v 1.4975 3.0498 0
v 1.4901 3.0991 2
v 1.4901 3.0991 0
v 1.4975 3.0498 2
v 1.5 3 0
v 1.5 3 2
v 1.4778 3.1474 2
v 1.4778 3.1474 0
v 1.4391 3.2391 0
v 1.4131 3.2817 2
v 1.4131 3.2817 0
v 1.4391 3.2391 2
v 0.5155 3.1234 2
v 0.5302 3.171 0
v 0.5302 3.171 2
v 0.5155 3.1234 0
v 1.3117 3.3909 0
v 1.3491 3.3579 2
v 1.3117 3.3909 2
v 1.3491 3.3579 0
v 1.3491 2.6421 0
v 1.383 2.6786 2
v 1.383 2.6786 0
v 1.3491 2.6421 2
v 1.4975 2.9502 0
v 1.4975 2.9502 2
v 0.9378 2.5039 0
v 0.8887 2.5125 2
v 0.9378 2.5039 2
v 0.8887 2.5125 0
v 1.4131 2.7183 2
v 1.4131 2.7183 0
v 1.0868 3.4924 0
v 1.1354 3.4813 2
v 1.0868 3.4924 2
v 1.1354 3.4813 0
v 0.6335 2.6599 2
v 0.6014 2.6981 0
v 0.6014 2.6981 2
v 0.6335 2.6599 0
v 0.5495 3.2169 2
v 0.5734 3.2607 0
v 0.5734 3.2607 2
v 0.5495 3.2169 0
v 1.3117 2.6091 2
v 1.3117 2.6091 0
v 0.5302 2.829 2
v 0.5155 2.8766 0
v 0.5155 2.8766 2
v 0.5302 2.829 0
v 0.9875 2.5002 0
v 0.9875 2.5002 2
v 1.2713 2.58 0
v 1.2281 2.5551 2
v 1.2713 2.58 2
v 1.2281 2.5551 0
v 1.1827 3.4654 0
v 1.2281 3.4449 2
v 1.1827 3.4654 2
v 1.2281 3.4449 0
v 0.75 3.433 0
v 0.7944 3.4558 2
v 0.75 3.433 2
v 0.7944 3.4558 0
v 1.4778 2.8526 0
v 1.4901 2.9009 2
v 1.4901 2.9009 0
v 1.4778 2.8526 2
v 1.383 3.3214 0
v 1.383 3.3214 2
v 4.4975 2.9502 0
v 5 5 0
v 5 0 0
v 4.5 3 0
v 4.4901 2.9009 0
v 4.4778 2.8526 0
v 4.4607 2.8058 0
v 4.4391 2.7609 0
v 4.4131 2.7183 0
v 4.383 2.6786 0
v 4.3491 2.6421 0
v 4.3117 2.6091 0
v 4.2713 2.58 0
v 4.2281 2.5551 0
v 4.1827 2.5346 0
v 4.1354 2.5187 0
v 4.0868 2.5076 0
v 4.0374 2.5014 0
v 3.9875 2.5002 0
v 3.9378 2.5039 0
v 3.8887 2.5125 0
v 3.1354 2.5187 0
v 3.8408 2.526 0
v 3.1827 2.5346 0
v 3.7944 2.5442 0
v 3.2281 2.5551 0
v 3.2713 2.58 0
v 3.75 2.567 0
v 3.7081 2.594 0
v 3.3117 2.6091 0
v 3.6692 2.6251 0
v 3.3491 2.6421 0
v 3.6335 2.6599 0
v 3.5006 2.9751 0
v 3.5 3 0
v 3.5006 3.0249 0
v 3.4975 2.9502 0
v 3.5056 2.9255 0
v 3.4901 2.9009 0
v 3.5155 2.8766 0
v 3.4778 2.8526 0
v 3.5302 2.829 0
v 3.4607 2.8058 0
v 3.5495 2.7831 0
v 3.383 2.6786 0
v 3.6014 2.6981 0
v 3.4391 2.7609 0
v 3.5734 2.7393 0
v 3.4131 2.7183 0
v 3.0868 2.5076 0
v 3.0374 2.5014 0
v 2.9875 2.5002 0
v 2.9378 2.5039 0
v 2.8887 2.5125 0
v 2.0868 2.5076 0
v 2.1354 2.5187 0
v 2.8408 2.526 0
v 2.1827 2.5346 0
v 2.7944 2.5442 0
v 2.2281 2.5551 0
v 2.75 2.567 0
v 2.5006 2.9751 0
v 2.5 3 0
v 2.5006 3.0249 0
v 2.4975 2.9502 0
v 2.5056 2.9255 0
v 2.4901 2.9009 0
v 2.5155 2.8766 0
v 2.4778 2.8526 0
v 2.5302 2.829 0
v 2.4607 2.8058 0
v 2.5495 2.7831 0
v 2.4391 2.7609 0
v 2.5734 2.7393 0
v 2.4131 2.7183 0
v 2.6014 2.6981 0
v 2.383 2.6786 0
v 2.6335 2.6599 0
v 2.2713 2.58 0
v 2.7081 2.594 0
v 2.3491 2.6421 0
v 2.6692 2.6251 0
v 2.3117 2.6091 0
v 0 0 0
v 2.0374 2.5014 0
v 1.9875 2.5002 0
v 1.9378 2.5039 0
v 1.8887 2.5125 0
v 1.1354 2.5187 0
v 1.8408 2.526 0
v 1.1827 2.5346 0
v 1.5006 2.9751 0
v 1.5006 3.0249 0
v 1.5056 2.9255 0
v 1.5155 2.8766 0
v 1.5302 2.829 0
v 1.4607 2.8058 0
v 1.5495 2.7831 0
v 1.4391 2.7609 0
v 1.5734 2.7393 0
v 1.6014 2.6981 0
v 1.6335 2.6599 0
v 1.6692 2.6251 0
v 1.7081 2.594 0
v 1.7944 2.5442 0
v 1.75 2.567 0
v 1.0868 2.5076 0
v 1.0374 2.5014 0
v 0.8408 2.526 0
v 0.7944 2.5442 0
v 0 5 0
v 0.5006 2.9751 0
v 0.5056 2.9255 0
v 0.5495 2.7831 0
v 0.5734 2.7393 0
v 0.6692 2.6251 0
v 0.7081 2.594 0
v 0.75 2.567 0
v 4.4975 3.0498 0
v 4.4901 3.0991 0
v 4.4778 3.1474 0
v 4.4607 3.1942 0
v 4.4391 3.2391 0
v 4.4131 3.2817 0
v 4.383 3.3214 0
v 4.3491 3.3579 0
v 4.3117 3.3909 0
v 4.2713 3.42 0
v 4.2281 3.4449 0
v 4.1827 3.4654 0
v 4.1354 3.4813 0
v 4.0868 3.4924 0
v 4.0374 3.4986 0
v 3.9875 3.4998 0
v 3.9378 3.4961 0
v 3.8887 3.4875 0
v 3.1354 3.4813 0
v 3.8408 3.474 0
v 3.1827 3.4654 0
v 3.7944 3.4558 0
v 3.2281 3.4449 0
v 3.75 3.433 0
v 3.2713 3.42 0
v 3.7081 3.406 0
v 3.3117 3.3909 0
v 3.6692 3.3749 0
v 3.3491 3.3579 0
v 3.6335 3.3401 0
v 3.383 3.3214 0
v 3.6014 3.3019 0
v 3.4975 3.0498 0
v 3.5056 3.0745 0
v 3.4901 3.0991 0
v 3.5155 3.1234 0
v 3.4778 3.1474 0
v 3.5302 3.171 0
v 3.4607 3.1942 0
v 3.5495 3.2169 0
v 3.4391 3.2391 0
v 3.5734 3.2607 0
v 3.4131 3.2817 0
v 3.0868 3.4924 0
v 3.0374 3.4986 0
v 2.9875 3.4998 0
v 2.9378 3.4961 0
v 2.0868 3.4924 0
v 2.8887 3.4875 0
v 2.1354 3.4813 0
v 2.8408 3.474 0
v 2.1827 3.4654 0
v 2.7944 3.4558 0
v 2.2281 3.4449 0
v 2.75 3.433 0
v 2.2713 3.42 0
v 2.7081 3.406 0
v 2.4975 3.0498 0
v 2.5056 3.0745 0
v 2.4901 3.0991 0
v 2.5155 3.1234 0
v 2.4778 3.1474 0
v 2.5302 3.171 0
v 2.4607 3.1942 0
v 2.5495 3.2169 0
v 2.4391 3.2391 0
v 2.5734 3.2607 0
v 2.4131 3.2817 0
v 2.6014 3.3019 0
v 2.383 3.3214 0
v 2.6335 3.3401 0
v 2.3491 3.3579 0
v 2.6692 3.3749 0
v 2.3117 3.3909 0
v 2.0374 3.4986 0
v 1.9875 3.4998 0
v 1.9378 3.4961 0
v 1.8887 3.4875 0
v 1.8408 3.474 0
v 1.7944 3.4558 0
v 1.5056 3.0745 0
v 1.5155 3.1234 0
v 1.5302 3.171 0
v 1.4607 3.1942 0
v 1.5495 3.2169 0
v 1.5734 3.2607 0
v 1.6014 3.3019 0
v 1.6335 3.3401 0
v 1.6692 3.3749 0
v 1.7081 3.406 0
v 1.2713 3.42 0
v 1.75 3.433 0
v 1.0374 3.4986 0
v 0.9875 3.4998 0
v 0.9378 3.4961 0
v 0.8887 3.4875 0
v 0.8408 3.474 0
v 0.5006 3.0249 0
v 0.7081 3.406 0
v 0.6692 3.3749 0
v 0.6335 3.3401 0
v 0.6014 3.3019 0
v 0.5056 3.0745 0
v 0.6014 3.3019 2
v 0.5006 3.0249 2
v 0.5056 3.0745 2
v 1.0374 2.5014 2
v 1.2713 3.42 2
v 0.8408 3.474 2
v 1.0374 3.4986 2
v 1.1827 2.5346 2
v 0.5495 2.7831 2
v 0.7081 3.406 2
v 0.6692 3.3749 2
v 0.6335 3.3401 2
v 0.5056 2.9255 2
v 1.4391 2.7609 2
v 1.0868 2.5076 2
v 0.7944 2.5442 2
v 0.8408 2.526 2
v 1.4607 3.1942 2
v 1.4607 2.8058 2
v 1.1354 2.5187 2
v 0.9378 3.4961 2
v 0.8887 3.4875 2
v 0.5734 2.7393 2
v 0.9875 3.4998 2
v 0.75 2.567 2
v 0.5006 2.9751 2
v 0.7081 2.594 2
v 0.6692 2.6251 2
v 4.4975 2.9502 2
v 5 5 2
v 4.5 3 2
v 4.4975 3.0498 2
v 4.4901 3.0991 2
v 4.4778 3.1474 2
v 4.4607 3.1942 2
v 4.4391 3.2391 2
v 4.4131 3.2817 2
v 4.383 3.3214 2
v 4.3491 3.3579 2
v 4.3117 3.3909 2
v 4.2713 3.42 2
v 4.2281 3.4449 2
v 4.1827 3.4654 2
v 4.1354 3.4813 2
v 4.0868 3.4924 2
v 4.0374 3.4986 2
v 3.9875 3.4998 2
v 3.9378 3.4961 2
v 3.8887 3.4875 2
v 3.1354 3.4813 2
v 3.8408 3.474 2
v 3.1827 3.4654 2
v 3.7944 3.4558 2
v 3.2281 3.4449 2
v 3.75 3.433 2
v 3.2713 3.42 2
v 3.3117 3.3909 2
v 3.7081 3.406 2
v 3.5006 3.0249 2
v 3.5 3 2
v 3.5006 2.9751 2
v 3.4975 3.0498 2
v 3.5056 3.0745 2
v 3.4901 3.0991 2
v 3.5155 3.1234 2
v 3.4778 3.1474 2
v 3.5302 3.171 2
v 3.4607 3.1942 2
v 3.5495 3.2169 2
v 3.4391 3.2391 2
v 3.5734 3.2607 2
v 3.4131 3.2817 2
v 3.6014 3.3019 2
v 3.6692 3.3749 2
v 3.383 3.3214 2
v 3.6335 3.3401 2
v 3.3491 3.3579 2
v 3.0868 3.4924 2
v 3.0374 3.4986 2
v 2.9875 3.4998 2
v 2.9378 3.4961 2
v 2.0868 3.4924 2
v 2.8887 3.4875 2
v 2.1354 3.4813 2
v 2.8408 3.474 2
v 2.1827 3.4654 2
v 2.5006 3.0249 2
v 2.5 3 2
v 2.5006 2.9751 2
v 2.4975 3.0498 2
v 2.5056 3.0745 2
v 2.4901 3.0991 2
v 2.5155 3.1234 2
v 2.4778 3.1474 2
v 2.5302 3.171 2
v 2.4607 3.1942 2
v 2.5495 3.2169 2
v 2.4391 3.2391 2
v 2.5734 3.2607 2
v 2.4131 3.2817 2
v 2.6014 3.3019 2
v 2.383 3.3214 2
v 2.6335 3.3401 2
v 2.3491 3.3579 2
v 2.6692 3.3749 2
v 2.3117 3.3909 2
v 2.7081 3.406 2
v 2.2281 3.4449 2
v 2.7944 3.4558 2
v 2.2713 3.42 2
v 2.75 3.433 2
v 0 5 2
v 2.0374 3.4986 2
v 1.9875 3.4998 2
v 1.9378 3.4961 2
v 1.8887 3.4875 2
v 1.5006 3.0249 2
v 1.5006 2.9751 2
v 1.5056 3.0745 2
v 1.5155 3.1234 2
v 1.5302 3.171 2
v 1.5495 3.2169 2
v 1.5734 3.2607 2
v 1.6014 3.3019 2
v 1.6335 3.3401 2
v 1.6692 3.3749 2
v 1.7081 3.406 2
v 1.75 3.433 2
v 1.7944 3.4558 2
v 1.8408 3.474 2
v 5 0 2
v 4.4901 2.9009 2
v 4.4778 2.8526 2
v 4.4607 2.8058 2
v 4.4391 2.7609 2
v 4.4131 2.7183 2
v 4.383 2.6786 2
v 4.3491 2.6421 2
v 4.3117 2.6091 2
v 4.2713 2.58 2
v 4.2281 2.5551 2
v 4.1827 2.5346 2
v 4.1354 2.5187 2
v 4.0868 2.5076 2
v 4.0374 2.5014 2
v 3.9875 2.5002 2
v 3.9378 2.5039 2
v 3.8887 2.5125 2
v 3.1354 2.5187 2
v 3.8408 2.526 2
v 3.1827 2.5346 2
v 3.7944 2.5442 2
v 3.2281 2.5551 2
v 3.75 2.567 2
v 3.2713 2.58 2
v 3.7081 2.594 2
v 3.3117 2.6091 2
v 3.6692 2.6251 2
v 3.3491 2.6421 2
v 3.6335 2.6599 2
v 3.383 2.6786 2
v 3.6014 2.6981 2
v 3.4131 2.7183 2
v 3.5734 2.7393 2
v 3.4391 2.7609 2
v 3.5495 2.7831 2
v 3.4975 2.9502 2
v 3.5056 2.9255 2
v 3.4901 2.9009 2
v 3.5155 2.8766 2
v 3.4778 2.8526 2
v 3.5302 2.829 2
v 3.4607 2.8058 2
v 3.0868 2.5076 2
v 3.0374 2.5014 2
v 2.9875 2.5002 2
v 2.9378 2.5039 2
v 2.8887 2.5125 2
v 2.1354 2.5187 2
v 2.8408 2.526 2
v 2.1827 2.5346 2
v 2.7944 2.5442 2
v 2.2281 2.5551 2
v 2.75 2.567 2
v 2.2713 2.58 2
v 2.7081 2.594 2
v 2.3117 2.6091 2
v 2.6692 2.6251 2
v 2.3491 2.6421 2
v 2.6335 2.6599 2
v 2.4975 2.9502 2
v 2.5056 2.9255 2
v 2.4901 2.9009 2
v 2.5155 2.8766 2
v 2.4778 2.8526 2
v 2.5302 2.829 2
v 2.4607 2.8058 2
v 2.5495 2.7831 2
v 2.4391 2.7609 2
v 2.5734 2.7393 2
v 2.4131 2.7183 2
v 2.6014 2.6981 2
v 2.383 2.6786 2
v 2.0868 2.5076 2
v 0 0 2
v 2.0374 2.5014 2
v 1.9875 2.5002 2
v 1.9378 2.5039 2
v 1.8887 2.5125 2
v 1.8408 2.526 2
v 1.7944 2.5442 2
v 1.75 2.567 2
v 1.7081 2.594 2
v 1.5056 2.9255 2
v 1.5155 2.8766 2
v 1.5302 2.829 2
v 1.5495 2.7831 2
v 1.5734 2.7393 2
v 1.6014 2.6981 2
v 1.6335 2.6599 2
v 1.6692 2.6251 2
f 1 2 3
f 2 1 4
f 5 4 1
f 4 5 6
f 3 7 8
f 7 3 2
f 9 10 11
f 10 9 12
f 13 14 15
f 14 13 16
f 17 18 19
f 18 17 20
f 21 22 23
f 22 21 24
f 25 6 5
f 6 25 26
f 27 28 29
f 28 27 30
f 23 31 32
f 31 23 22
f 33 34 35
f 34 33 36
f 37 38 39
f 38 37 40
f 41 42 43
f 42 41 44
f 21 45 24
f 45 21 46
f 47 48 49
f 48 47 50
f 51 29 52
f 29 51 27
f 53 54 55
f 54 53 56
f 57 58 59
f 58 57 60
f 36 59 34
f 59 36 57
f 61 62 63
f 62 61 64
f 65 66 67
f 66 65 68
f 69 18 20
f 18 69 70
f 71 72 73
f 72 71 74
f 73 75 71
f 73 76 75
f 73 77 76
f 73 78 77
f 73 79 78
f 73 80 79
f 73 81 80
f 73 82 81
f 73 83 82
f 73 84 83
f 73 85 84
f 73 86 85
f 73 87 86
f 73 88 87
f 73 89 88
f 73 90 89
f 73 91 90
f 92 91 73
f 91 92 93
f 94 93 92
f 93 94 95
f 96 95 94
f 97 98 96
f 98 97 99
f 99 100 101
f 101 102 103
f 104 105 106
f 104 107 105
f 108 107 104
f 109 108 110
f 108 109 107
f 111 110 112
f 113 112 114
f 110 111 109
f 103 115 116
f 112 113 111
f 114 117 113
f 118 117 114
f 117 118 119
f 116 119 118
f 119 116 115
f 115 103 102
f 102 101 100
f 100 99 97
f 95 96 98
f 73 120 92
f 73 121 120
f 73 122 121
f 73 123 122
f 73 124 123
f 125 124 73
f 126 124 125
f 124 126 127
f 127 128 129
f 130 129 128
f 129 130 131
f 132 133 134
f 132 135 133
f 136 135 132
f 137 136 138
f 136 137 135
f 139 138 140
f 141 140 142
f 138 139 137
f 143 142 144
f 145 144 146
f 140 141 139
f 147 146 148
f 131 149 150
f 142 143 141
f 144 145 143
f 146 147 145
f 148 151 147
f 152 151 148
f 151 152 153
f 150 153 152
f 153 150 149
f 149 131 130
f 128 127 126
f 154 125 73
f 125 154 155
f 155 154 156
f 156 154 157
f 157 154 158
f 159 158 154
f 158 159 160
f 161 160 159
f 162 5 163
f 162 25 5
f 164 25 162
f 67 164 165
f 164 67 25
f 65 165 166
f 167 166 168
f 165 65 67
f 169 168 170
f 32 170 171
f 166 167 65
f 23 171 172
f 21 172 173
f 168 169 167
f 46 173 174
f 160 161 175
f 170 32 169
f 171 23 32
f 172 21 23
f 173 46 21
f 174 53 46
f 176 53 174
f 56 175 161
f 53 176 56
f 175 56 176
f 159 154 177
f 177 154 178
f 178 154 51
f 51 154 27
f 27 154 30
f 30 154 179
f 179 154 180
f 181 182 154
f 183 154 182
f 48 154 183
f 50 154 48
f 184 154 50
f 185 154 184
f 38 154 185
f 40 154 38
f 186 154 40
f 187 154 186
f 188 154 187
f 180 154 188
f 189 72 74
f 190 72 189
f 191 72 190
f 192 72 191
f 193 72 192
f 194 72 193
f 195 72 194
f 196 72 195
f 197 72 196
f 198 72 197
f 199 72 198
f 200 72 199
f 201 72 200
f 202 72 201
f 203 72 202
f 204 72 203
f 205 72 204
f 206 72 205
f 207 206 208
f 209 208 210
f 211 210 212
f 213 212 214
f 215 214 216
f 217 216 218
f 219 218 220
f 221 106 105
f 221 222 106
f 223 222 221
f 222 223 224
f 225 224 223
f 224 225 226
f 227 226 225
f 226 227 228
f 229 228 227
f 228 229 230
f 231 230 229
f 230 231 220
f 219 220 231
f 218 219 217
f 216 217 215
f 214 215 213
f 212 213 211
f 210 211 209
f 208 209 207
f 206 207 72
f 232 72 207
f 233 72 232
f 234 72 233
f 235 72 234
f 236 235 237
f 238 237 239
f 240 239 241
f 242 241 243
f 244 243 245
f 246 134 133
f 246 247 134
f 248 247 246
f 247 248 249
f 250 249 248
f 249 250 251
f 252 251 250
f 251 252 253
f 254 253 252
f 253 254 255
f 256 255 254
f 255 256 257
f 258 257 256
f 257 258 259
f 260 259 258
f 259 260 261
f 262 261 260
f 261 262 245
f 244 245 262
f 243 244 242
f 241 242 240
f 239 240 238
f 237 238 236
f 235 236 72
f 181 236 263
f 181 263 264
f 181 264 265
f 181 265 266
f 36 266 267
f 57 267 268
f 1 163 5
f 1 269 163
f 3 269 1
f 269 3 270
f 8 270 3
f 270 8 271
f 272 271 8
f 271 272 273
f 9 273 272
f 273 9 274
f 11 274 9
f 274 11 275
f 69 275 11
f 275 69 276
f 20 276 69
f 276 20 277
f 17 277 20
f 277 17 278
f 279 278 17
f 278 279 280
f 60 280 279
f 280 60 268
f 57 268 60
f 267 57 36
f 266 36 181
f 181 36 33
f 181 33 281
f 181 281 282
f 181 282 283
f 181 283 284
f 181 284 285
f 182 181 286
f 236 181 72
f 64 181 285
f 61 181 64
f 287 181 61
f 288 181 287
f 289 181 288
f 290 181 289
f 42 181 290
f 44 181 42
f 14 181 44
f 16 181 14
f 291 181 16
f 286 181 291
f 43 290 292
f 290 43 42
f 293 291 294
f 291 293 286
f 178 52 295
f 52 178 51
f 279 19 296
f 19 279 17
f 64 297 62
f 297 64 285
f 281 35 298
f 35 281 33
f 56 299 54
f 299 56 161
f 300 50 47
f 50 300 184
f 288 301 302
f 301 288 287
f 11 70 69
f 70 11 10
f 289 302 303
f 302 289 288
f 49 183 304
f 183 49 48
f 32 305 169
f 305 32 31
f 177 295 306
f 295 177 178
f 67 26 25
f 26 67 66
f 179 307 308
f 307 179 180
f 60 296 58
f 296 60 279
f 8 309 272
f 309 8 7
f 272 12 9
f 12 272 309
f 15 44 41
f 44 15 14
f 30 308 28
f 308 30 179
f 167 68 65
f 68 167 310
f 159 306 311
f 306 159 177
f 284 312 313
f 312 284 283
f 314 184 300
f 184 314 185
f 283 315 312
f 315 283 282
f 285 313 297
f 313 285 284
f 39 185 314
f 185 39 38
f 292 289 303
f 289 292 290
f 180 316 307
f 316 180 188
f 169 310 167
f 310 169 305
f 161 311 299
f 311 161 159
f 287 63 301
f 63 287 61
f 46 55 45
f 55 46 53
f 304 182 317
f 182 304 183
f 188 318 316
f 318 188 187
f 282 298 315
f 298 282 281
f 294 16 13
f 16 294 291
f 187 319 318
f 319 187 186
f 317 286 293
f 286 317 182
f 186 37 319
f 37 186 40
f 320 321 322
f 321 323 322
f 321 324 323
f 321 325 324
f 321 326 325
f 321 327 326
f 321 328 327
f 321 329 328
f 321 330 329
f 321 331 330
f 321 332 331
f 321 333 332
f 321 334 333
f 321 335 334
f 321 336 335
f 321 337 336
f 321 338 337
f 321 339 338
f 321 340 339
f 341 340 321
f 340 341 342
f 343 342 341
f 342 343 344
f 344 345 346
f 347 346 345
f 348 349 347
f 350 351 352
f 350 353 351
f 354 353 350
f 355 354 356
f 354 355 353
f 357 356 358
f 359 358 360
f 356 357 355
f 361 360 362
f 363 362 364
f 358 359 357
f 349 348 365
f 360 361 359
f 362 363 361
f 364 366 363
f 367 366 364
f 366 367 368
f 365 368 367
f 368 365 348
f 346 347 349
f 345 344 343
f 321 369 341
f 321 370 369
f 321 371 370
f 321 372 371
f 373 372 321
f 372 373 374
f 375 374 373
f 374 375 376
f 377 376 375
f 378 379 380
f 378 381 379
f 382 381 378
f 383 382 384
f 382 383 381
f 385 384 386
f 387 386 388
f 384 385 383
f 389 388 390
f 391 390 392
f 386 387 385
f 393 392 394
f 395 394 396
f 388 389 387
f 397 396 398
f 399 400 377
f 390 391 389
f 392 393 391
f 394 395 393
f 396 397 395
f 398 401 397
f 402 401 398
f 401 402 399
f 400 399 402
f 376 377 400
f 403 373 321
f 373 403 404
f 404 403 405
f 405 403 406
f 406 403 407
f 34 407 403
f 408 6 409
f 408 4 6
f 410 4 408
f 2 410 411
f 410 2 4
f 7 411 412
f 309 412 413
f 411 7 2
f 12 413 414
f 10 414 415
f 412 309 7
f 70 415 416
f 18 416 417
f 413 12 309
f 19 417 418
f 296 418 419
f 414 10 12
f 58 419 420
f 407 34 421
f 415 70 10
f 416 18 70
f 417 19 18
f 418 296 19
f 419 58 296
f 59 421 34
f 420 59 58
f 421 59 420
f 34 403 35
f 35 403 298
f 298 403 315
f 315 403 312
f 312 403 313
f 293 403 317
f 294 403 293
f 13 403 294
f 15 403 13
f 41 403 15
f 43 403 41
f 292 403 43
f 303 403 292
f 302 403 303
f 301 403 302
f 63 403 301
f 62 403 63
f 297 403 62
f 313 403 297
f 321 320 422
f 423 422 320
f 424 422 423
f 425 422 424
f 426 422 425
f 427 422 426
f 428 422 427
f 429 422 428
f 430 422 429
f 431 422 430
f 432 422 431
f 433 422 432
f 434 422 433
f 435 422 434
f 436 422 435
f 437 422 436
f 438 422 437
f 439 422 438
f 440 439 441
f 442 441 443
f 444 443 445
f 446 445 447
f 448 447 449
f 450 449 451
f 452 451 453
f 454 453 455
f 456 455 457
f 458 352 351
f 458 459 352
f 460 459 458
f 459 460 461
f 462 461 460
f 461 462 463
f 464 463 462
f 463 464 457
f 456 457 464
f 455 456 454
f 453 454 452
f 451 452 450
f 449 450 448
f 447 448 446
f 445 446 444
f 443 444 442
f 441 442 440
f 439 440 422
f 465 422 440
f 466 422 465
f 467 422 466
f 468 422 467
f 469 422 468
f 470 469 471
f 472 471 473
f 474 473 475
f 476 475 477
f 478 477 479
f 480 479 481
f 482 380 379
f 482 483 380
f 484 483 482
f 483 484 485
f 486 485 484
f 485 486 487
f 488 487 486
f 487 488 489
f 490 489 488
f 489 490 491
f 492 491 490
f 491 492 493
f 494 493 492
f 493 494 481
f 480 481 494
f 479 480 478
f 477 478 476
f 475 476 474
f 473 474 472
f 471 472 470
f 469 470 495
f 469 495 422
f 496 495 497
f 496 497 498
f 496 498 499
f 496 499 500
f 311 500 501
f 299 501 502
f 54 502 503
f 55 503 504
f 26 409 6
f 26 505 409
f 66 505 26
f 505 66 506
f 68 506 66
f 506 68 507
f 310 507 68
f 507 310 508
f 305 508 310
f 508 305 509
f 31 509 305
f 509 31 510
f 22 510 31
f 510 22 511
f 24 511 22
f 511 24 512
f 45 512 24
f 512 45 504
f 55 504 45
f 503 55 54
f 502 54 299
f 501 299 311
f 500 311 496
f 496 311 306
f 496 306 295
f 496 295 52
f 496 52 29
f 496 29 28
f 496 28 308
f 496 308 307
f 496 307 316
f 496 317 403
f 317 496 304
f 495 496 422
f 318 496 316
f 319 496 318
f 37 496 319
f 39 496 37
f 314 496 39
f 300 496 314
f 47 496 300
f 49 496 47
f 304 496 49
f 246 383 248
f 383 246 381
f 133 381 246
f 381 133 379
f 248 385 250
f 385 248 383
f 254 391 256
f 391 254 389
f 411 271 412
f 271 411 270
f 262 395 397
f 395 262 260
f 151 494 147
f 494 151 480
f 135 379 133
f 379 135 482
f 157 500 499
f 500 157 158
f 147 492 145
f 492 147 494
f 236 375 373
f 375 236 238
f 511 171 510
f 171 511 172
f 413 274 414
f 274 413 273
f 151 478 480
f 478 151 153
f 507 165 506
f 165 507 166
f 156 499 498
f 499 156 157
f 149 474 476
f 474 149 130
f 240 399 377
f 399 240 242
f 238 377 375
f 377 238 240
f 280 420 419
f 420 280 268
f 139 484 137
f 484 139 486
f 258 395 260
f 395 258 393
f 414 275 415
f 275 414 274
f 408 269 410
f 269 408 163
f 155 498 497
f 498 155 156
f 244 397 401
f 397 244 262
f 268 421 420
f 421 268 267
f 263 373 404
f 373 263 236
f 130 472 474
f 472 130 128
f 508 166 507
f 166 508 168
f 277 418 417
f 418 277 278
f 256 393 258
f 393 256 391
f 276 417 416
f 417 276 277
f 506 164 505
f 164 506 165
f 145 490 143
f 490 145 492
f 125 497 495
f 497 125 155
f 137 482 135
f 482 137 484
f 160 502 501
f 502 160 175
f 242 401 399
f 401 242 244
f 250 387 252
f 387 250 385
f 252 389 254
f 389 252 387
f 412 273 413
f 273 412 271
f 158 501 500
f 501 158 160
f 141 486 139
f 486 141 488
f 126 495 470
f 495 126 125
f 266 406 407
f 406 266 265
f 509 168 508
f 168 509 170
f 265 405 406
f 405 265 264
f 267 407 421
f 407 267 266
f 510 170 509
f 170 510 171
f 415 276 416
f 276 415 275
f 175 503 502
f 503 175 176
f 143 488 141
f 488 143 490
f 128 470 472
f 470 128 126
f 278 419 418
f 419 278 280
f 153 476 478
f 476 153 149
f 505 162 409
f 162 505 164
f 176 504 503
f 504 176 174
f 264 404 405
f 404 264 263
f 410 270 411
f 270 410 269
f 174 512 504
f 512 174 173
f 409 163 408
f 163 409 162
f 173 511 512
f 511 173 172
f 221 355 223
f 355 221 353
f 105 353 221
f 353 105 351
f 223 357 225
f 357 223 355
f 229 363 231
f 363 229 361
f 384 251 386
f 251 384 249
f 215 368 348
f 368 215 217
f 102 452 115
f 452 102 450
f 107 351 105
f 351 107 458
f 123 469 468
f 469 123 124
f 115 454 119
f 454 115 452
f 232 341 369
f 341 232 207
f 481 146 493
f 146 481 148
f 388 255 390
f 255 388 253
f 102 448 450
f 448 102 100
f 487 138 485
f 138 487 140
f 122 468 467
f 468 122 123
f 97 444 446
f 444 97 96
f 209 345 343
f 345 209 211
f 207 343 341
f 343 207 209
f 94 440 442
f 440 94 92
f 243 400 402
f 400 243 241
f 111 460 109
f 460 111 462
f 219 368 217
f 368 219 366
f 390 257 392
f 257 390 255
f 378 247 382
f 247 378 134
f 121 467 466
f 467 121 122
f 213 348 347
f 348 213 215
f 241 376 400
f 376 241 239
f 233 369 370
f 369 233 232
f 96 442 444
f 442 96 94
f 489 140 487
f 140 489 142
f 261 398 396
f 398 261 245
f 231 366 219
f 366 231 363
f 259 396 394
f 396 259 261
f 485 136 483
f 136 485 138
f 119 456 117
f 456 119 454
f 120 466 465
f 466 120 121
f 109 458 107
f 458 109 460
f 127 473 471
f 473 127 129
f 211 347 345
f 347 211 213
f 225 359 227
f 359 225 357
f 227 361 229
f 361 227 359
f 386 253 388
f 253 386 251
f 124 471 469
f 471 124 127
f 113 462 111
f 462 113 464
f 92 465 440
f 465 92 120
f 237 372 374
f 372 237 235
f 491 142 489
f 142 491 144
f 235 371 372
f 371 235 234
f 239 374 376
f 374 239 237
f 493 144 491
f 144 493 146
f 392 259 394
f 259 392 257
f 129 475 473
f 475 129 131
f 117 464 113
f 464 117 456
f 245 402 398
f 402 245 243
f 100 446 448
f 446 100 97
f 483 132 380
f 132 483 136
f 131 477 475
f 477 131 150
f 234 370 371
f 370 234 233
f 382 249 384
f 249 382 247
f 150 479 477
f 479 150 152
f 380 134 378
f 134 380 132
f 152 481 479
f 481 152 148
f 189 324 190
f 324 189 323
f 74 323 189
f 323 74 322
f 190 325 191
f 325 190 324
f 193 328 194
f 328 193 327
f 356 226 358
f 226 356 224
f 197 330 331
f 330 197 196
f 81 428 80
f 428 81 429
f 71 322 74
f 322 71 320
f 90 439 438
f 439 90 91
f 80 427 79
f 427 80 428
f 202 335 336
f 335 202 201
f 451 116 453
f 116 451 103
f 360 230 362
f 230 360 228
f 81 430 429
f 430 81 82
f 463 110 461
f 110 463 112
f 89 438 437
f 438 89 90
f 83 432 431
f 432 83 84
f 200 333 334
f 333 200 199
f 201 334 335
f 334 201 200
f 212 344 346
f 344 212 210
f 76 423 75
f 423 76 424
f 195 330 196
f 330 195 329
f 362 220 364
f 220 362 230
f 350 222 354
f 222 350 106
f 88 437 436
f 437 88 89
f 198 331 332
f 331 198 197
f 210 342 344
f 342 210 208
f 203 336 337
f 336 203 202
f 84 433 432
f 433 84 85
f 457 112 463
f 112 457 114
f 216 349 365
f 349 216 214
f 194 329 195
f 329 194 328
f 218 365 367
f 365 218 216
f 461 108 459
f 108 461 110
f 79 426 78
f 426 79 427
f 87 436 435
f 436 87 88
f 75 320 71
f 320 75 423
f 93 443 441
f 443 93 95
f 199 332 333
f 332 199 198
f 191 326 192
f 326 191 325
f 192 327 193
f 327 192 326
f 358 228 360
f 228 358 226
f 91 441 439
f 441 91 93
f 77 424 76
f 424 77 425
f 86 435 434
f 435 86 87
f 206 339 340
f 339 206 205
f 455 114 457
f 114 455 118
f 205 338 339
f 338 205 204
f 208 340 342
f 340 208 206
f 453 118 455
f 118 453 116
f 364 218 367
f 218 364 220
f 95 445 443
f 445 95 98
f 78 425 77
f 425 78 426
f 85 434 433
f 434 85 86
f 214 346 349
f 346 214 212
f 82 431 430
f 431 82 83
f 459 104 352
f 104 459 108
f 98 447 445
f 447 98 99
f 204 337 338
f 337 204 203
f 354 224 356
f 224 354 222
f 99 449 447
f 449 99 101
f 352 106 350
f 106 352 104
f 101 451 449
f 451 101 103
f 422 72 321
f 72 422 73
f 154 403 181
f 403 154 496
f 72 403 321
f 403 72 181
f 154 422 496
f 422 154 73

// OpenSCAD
$fa = 1;
$fs = 0.05;

module base() {
    cube([5, 5, 2]);
}

module holes() {
  translate([1, 3, 0]) {
    cylinder(h = 2, r1 = 0.5, r2 = 0.5);
  }

  translate([2, 3, 0]) {
    cylinder(h = 2, r1 = 0.5, r2 = 0.5);
  }

  translate([3, 3, 0]) {
    cylinder(h = 2, r1 = 0.5, r2 = 0.5);
  }

  translate([4, 3, 0]) {
    cylinder(h = 2, r1 = 0.5, r2 = 0.5);
  }
}

difference() {
    base();
    holes();    
}
